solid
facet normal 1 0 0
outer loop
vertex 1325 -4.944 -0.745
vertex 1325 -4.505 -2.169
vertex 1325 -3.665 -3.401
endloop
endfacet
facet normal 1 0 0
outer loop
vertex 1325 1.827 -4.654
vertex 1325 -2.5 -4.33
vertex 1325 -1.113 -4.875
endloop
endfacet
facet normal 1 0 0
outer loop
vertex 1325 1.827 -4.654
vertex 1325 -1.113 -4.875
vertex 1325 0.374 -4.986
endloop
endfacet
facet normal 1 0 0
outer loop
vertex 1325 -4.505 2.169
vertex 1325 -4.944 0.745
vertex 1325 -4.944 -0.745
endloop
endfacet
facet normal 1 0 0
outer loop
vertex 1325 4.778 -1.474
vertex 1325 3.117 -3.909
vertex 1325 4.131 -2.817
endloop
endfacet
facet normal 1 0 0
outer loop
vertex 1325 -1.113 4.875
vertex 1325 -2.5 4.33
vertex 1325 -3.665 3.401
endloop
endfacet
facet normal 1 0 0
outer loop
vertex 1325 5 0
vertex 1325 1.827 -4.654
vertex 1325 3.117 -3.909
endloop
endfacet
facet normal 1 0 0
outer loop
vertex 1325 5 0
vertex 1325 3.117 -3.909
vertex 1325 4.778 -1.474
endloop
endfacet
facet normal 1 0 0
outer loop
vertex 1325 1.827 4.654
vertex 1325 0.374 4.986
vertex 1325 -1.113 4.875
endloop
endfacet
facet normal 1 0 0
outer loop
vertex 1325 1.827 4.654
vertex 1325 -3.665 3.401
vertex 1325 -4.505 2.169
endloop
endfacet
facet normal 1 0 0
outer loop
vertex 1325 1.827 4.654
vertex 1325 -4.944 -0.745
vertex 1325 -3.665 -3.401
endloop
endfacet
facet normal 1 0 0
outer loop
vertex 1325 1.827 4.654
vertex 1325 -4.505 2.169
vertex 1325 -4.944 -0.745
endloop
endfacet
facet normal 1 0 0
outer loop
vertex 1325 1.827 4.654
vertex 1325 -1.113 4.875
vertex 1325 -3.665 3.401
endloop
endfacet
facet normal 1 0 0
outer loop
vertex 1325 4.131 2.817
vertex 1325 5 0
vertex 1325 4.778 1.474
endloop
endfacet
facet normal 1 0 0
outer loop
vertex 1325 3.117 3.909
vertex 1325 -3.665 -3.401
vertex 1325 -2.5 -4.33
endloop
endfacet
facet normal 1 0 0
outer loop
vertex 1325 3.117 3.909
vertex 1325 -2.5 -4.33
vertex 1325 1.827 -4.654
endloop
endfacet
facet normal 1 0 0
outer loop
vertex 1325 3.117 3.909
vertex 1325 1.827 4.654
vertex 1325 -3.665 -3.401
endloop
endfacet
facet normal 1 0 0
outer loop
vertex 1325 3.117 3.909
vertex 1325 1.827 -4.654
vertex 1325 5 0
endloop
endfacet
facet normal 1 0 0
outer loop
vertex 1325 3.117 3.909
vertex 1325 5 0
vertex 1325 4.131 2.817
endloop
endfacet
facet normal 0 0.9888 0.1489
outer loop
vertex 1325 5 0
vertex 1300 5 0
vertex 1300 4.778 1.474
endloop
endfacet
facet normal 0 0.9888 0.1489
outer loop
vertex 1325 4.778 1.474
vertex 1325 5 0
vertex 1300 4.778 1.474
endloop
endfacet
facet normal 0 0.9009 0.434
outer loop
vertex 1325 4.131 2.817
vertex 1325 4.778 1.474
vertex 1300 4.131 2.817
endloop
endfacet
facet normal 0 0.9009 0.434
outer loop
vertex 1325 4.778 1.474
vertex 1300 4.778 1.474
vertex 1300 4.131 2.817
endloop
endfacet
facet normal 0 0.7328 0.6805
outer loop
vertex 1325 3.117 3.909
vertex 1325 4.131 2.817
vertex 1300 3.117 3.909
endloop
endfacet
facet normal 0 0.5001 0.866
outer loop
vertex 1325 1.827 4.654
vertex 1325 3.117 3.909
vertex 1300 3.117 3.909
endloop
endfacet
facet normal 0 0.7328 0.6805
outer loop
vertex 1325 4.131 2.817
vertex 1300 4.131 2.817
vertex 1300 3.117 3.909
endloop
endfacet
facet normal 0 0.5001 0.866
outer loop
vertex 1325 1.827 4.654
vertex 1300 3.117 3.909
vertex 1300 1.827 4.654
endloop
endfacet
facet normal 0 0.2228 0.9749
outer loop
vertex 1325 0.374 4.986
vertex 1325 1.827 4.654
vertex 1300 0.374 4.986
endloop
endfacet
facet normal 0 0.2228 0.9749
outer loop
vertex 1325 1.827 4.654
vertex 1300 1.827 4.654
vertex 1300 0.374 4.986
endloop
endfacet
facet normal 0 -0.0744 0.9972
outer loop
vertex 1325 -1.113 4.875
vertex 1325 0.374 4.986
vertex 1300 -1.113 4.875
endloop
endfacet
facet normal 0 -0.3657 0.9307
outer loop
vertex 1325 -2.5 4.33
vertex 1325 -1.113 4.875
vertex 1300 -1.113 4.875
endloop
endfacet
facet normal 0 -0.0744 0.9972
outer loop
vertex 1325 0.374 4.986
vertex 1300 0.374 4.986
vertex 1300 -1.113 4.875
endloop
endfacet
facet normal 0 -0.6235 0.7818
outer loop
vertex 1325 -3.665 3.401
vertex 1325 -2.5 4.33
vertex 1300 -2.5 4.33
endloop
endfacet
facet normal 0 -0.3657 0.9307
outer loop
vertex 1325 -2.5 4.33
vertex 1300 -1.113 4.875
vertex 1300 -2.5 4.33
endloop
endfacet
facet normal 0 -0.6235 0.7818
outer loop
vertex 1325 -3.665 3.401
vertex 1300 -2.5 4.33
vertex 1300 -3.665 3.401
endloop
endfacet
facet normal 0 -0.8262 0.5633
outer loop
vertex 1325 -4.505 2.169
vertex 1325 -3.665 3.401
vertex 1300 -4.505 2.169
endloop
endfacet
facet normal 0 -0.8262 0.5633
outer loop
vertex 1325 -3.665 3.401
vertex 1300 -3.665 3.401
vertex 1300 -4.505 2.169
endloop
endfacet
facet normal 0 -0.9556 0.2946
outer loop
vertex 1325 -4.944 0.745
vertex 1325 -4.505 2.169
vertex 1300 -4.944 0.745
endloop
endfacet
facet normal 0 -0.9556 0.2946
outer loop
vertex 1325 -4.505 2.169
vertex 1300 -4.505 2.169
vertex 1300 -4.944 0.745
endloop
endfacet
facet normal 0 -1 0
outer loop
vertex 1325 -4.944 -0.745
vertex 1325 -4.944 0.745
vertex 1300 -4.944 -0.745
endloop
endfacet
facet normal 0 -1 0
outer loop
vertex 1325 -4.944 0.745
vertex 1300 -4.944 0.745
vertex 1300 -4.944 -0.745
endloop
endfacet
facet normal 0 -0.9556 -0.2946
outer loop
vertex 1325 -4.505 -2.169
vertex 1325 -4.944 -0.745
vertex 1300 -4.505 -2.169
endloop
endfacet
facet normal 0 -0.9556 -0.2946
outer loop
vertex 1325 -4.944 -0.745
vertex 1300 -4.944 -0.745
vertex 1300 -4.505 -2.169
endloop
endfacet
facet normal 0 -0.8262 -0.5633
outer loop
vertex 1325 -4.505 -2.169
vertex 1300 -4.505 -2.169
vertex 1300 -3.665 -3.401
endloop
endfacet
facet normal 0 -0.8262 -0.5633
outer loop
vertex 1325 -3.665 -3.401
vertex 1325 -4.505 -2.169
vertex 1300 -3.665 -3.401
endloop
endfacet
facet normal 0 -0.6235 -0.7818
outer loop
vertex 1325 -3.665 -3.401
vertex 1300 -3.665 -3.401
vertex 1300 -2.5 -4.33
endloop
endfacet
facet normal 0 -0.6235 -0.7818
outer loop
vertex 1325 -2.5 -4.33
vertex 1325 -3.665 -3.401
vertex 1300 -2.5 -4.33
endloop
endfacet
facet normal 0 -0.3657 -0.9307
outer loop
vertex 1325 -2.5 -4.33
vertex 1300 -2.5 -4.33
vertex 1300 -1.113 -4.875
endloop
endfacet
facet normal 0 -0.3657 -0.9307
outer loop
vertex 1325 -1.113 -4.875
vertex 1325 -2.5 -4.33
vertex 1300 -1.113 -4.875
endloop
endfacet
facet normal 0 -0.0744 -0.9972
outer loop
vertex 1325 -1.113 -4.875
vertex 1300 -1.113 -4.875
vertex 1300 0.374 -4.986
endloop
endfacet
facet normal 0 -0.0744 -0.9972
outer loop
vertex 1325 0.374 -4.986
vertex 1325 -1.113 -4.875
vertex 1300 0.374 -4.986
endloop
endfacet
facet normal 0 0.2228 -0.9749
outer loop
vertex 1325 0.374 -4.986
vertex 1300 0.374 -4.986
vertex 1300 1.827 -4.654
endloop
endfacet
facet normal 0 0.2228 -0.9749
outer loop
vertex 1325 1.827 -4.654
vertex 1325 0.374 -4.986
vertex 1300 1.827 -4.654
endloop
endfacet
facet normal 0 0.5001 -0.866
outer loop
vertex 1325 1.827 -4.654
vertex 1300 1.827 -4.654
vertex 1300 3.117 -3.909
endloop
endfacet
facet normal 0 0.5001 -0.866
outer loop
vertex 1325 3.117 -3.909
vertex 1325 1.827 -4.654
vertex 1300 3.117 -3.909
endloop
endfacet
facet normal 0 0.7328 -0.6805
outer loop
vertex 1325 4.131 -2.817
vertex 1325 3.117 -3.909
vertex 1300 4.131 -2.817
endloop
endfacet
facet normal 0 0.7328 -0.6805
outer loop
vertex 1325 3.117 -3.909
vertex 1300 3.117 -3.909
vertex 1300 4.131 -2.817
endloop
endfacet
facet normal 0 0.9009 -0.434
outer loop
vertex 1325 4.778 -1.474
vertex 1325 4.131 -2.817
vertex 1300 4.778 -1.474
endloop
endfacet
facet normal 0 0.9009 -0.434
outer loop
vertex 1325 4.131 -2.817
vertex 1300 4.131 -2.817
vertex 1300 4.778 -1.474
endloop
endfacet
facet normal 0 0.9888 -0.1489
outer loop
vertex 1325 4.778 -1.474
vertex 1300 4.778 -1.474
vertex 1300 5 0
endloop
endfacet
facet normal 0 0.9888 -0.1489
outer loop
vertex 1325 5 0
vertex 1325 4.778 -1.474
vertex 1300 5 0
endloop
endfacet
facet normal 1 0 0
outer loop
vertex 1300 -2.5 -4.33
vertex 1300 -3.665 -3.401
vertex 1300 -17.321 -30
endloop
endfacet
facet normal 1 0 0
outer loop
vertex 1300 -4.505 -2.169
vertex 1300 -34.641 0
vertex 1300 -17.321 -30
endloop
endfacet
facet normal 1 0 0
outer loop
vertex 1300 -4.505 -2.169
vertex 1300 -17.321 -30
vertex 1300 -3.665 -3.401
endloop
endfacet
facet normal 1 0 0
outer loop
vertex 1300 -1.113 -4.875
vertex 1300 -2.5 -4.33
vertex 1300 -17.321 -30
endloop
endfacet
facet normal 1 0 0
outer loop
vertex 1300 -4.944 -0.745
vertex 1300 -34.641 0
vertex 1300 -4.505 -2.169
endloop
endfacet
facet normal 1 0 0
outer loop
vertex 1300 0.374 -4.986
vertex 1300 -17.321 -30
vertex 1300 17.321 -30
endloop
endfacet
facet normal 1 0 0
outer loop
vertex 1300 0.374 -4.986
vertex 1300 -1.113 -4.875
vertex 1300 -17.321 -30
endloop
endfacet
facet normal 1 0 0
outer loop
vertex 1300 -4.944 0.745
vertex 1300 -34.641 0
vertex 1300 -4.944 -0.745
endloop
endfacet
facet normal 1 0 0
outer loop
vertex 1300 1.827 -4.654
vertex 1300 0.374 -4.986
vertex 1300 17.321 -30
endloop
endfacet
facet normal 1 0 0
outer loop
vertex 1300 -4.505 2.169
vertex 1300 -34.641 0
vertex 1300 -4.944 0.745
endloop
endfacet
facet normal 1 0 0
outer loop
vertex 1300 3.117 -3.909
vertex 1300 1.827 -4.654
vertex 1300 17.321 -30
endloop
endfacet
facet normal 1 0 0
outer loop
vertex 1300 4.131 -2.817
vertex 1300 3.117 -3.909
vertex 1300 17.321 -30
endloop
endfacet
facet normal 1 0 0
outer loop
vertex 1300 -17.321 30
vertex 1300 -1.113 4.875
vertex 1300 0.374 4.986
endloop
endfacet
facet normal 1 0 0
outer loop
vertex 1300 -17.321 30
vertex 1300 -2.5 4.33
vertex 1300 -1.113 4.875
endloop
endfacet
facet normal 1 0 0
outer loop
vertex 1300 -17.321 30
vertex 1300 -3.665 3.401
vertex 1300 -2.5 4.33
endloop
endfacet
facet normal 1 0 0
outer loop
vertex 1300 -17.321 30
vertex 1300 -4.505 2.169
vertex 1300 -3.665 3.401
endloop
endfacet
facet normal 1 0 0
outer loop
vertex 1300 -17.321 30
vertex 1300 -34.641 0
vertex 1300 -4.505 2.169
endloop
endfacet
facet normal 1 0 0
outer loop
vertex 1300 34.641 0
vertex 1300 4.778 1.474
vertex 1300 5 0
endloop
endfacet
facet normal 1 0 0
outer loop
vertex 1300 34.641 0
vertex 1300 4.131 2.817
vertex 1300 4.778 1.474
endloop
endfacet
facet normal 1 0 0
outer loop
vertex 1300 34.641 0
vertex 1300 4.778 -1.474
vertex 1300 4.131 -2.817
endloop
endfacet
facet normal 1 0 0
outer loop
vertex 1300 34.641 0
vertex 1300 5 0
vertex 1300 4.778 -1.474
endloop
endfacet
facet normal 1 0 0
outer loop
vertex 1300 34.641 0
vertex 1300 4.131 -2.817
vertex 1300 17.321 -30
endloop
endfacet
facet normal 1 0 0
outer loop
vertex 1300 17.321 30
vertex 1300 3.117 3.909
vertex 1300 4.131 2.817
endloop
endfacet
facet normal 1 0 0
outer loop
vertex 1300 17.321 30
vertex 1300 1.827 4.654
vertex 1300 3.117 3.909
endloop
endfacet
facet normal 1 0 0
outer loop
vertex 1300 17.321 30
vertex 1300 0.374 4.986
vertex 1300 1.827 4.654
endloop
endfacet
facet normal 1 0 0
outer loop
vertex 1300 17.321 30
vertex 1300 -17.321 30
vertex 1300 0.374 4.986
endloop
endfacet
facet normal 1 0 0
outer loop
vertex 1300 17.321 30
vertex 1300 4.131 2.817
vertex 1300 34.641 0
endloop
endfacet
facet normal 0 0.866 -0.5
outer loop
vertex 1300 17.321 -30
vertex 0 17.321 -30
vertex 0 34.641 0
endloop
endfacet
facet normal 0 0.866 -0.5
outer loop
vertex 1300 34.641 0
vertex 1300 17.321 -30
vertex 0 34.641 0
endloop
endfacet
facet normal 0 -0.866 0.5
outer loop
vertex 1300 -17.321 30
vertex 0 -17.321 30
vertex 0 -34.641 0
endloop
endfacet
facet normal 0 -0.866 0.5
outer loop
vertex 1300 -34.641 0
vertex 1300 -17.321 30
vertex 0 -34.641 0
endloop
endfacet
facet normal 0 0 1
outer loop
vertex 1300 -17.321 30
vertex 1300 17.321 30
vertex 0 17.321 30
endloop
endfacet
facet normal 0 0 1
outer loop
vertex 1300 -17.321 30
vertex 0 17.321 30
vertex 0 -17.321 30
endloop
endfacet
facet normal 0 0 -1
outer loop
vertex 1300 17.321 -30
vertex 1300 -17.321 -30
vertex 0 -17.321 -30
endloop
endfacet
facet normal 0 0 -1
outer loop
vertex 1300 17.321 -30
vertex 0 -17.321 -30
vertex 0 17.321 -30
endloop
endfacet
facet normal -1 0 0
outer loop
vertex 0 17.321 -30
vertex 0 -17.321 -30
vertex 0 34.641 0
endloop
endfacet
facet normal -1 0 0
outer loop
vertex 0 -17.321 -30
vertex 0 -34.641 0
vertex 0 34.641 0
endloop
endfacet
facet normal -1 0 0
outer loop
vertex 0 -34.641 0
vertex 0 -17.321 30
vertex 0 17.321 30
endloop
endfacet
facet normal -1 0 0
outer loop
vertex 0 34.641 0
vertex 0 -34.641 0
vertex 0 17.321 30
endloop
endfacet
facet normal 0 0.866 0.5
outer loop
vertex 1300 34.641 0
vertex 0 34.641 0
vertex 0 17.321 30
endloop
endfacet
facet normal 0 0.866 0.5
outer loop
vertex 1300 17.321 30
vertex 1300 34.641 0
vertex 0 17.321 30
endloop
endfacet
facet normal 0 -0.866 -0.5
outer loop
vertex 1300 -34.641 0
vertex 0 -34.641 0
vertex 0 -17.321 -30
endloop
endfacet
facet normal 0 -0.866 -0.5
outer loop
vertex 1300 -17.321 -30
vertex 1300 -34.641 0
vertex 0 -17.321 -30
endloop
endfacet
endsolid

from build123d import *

# Parameters (mm, degrees)
F1_DEPTH = 1300
F2_R     = 5
F3_DEPTH = 25


with BuildPart() as f1:
    # F0 (on Right) → F1 (new body)
    with BuildSketch(Plane.YZ):
        Polygon((-17.320508, -30), (17.320508, -30), (34.641016, 0), (17.320508, 30), (-17.320508, 30), (-34.641016, 0), align=None)
    extrude(amount=F1_DEPTH)

    # F2 (on face) → F3 (join)
    with BuildSketch(Plane.YZ.offset(1300)):
        Circle(F2_R)
    extrude(amount=F3_DEPTH)


solid = f1.part
